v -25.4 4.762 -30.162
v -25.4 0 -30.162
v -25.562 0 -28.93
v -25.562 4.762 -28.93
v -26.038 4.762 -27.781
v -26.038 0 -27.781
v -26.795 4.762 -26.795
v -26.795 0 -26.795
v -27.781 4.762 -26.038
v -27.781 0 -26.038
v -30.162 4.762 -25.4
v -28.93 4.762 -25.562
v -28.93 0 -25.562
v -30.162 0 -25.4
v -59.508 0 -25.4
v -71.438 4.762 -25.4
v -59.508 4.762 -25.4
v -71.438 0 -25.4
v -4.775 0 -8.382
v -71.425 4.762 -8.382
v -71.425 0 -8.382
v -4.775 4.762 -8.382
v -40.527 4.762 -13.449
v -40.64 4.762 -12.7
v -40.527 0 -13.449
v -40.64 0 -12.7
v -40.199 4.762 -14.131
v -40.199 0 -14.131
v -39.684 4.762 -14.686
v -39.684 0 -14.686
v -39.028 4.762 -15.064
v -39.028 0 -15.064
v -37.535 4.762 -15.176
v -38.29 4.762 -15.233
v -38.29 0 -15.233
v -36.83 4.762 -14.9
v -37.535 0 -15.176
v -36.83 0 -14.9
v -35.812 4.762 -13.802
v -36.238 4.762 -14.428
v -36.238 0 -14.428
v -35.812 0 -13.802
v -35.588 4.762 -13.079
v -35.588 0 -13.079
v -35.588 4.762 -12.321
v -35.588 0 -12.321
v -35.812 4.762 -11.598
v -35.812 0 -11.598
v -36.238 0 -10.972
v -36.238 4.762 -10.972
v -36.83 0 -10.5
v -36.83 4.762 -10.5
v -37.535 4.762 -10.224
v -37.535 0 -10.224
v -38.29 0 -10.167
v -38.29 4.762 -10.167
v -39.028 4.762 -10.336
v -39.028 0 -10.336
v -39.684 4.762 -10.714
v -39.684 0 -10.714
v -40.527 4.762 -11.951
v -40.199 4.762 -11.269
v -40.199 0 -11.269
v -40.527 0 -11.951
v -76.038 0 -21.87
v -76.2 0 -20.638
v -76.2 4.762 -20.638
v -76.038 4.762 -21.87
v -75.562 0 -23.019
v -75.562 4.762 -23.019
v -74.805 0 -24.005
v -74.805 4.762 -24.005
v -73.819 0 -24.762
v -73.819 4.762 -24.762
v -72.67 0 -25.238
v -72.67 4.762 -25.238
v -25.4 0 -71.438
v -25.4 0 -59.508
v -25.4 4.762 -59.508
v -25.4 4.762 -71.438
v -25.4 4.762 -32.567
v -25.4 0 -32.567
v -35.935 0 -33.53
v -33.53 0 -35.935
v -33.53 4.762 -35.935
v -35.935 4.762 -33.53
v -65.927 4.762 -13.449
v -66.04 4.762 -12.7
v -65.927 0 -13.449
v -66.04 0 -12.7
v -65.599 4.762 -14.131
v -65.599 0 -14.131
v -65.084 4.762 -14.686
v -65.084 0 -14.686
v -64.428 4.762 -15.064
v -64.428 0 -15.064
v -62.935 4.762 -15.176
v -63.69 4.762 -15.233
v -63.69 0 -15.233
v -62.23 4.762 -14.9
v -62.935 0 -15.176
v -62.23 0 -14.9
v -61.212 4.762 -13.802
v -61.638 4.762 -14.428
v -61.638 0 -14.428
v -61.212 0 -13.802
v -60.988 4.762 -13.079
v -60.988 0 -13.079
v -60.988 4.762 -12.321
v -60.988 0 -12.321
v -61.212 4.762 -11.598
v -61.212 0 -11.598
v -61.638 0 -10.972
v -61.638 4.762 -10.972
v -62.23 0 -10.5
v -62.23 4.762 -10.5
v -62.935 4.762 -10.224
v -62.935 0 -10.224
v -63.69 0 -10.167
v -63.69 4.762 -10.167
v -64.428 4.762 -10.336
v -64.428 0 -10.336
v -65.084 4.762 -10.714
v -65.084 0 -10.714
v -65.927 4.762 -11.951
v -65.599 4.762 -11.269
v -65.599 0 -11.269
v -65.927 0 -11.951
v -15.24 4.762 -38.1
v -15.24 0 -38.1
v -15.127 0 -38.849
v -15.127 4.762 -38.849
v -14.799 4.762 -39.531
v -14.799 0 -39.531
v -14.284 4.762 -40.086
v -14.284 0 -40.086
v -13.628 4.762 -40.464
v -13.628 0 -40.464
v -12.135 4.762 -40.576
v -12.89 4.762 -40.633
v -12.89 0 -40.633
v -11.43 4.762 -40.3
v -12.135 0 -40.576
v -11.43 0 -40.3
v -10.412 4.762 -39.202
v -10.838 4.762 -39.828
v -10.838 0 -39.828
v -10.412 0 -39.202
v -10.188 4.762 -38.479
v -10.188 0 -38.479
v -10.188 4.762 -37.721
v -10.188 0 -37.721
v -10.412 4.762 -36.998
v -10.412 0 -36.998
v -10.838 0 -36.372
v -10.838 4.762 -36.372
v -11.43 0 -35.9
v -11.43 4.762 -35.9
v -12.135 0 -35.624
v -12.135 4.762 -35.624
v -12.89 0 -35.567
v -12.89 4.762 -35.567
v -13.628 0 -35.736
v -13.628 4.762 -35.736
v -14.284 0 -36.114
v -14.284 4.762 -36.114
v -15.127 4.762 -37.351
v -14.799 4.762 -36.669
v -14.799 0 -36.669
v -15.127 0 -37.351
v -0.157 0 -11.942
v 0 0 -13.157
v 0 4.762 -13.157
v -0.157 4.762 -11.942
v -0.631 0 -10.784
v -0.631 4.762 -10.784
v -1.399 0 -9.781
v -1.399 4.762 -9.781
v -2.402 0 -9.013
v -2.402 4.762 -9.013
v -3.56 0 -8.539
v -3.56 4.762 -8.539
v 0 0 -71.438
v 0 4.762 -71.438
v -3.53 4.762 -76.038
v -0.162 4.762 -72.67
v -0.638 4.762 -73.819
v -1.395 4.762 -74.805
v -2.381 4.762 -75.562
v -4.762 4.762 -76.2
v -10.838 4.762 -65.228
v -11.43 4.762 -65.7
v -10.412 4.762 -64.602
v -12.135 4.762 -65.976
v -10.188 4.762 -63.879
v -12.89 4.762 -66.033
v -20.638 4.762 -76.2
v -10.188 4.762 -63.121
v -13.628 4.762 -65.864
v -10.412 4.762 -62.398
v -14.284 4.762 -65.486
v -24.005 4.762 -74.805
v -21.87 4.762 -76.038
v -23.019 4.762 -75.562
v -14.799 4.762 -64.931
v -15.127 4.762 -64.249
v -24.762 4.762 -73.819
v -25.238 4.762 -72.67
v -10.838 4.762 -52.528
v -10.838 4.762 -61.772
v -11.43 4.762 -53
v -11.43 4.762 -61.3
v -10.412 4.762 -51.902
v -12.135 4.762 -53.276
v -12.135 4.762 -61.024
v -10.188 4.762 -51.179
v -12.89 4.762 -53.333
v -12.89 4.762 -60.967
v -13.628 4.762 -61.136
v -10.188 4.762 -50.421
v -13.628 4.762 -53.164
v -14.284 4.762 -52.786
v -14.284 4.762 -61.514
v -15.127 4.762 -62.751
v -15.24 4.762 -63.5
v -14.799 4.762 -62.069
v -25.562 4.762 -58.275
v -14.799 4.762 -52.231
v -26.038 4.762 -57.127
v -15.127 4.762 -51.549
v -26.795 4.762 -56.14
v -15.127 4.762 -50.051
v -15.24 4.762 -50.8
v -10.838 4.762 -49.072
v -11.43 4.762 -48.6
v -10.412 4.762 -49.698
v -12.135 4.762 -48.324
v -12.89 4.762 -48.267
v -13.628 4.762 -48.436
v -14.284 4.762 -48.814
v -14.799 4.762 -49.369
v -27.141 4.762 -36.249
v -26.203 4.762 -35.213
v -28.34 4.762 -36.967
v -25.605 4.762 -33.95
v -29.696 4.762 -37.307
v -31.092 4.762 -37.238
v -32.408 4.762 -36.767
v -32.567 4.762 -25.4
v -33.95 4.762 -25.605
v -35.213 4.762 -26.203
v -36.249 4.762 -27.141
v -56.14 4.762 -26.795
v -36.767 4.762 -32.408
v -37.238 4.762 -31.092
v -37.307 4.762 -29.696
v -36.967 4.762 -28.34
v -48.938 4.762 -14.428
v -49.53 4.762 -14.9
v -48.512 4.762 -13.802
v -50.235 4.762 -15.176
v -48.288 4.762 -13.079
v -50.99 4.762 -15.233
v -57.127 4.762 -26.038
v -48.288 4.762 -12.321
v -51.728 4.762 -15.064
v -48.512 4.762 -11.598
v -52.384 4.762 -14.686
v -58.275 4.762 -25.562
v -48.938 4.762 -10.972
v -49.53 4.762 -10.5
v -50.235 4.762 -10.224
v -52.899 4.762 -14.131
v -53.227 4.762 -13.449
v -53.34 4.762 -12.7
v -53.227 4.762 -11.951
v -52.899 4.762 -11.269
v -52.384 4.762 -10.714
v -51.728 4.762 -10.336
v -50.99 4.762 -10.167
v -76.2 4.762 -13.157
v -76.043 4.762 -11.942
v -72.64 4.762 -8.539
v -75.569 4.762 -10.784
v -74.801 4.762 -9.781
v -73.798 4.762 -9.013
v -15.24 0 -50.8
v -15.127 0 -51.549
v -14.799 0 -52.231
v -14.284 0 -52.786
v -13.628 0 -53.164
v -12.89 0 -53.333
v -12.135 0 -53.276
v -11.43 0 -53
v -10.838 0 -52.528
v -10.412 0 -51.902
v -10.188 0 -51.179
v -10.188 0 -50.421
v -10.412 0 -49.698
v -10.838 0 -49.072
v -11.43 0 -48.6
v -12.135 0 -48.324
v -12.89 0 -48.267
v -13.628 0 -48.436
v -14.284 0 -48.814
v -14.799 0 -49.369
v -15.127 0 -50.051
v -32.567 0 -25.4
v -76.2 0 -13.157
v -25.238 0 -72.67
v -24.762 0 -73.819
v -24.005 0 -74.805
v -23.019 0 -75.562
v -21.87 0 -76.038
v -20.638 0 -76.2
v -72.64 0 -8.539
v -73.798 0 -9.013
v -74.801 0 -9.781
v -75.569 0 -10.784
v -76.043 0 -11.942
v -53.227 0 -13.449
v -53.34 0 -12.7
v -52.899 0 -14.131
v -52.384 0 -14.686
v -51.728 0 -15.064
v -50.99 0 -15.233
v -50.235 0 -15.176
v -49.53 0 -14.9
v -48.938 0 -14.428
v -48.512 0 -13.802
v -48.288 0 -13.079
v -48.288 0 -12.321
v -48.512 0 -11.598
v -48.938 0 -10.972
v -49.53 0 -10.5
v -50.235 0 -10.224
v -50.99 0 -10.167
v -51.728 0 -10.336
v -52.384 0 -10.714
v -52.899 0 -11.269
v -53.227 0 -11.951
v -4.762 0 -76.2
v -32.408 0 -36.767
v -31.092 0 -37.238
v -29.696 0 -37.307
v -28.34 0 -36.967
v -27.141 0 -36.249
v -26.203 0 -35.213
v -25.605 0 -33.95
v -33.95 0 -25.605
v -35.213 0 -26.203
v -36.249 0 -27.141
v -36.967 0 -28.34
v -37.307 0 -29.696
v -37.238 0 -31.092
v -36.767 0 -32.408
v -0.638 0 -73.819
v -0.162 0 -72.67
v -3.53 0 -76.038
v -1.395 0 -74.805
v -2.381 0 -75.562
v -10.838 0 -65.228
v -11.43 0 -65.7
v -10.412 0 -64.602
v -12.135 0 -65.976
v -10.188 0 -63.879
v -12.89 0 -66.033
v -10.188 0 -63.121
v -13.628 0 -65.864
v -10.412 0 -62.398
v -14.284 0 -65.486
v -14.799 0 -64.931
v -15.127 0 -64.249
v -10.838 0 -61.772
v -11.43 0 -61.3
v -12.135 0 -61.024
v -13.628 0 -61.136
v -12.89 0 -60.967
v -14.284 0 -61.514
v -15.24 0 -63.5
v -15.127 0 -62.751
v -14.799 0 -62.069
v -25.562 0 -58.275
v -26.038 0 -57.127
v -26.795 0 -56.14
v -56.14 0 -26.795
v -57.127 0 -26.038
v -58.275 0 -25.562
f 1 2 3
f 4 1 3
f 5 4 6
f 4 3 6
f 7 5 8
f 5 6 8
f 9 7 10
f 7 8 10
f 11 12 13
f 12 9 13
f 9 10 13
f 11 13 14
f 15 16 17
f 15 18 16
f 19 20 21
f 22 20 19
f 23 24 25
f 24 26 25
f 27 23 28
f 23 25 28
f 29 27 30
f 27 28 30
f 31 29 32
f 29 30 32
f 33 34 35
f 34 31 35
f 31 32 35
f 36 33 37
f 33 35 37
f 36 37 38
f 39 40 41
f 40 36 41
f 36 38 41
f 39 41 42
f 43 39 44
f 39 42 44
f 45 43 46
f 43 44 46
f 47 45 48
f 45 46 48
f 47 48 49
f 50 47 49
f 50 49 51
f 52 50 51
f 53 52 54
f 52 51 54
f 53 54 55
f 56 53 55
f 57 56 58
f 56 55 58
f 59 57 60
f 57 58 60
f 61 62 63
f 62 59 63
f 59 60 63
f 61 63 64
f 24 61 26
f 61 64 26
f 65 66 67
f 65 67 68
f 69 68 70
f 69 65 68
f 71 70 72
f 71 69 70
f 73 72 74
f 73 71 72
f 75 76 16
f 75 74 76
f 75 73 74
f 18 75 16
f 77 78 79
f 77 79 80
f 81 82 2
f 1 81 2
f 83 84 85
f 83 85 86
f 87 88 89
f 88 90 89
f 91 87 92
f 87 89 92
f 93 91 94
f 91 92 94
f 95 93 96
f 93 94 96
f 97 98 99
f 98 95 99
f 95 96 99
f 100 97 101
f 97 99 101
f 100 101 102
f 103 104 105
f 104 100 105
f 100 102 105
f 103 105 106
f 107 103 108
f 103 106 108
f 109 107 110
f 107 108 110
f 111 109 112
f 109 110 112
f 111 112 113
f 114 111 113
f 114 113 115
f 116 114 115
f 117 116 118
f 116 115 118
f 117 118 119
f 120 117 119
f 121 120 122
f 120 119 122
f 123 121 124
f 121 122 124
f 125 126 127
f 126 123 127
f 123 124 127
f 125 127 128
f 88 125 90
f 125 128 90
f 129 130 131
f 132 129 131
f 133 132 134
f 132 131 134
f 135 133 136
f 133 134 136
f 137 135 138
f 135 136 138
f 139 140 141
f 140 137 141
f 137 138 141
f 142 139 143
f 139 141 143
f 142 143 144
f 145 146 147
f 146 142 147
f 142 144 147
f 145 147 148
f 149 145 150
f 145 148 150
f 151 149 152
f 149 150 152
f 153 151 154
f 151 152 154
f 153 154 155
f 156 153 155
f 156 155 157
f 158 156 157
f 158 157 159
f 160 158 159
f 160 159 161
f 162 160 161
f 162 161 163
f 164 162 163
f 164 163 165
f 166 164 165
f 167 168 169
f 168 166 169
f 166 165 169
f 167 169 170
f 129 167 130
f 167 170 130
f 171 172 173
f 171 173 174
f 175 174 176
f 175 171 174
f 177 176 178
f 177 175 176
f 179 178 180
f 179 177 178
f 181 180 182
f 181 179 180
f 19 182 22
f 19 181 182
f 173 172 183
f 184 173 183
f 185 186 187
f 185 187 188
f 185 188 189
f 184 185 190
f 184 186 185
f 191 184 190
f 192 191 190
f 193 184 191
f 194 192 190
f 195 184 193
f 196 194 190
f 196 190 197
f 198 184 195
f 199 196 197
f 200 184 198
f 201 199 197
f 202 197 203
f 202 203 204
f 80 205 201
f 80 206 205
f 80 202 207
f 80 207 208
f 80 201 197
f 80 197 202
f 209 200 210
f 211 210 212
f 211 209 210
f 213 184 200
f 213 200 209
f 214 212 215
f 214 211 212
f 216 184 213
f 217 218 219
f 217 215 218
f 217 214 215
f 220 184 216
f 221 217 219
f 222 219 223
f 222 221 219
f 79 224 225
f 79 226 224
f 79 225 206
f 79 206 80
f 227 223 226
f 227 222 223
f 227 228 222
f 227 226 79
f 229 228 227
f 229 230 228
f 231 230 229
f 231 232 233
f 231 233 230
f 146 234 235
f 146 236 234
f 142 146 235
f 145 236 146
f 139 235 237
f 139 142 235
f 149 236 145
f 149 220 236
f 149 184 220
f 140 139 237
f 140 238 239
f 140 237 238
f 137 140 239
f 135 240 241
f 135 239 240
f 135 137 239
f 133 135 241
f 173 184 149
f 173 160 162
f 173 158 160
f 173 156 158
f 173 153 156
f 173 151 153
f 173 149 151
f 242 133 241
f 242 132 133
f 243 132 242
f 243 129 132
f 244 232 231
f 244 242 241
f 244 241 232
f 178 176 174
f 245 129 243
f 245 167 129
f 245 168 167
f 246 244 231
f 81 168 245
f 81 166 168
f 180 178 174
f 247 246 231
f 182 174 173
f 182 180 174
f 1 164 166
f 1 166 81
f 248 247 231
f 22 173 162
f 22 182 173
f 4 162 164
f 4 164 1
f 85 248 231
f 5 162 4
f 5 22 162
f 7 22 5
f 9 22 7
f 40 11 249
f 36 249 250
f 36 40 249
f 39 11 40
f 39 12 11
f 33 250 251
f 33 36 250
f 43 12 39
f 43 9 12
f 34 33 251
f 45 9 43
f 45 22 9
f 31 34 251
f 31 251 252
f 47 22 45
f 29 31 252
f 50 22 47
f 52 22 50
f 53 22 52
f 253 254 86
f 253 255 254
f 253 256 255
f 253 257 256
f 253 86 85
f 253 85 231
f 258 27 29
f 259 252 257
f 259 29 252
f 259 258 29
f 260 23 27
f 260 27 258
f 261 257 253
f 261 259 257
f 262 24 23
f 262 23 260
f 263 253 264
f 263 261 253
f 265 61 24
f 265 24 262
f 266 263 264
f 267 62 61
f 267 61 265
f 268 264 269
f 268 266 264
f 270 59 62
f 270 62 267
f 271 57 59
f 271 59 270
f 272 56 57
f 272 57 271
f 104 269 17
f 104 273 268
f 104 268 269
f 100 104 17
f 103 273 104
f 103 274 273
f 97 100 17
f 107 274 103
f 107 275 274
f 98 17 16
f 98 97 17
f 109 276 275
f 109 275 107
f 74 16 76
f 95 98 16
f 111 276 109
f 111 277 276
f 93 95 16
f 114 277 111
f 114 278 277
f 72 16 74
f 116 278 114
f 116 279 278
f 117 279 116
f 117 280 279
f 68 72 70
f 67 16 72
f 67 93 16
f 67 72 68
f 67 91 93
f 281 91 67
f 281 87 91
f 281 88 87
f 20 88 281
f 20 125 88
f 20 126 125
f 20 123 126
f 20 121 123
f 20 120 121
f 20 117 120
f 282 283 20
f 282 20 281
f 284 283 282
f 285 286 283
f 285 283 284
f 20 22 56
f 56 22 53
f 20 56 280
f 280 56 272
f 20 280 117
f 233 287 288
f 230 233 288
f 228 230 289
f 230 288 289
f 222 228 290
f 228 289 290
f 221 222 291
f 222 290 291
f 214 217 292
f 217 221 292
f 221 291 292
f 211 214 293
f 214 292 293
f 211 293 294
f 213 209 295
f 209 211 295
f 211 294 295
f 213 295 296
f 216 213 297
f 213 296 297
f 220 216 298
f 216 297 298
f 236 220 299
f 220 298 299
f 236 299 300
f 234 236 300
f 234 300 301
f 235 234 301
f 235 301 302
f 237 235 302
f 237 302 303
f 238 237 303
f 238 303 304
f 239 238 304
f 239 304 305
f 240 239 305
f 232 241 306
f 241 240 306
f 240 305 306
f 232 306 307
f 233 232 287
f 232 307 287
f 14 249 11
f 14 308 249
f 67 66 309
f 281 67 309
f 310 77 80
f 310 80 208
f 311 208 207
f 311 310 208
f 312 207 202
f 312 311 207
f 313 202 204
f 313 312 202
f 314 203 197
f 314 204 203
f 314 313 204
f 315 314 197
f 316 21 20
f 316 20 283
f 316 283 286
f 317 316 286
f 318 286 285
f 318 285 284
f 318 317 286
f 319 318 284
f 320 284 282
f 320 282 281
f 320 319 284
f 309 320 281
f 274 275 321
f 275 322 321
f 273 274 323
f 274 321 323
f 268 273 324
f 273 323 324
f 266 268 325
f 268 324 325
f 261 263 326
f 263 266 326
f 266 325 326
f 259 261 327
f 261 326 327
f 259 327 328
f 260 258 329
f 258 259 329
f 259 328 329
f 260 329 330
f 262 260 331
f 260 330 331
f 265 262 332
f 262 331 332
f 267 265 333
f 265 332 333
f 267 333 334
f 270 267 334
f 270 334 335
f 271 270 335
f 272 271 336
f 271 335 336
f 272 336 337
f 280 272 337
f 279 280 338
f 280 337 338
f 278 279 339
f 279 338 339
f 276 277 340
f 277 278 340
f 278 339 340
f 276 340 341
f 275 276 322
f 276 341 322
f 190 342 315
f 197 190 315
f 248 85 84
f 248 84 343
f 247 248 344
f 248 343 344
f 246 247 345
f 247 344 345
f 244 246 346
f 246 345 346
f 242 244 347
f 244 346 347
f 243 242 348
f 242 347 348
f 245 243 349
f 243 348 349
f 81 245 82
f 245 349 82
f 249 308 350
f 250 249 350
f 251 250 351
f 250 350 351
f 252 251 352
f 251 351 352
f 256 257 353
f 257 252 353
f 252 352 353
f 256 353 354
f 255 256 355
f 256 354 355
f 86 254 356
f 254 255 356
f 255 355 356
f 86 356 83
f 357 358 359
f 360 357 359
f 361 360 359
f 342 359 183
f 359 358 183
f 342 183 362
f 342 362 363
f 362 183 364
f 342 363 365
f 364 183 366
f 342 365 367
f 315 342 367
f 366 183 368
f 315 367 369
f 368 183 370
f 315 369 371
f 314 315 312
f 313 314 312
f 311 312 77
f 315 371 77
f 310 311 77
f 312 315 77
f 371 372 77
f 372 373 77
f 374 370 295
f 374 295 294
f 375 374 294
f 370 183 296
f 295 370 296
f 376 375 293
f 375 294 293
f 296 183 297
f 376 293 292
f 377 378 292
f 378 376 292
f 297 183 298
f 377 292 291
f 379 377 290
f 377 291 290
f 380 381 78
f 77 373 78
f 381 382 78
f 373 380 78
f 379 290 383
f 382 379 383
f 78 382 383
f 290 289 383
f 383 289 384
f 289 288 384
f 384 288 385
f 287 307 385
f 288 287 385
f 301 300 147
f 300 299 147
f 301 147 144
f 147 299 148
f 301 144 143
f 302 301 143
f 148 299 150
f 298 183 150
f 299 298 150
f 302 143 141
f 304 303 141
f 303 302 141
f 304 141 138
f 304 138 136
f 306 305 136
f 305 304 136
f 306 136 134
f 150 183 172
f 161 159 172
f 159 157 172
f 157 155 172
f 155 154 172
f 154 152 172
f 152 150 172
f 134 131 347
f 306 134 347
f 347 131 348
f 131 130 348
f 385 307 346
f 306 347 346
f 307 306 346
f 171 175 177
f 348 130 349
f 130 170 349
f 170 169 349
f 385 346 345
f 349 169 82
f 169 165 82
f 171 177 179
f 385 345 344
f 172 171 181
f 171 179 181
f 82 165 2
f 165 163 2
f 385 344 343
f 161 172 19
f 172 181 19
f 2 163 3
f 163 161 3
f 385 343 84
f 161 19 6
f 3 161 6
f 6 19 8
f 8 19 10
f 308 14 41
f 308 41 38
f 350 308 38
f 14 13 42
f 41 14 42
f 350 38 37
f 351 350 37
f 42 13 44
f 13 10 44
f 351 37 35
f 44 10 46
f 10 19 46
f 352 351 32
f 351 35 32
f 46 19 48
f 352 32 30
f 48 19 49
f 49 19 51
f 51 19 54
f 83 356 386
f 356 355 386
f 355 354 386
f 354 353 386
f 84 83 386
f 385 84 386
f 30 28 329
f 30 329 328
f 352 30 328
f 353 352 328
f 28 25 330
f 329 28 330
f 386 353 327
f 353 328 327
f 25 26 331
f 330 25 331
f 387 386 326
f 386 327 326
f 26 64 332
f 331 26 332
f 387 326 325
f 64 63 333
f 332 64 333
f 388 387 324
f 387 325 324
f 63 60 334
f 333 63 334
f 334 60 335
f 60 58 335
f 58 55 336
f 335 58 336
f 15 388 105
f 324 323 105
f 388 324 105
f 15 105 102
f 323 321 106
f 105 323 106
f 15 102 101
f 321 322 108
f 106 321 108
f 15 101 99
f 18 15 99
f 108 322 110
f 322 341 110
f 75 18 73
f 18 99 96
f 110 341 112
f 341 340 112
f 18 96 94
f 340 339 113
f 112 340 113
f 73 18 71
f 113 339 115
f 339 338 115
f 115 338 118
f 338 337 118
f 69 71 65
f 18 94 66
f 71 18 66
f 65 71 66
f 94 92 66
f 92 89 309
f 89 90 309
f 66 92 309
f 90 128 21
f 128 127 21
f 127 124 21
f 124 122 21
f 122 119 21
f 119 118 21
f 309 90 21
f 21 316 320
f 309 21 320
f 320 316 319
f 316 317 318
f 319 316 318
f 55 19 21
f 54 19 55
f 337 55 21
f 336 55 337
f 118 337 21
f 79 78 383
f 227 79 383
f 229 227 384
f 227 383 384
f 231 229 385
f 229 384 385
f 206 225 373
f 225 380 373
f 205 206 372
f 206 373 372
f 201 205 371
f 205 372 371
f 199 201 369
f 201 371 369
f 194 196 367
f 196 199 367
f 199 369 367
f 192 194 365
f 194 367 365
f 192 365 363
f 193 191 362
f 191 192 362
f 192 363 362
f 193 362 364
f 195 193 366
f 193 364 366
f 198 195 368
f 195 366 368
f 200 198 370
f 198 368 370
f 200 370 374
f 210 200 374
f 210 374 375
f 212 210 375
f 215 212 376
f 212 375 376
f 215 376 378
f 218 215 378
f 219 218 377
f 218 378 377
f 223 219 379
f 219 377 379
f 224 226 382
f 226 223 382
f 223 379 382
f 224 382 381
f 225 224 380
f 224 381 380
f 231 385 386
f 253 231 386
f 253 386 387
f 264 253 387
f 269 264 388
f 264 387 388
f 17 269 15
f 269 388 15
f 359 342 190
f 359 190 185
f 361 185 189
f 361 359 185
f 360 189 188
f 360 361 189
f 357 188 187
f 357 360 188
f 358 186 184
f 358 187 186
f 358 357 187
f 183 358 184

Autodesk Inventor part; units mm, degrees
ref_plane "YZ Plane" through (0, 0, 0) normal (1, 0, 0) x (0, 1, 0)
ref_plane "XZ Plane" through (0, 0, 0) normal (0, 1, 0) x (-1, 0, 0)
ref_plane "XY Plane" through (0, 0, 0) normal (0, 0, 1) x (1, 0, 0)
sketch "Sketch1" plane through (0, 0, 0) normal (0, 1, 0) x (-1, 0, 0)
  line L0 (0, -11.8745) -> (0, -71.4375)
  line L1 (4.7625, -76.2) -> (20.6375, -76.2)
  line L2 (76.2, -20.6375) -> (76.2, -11.8745)
  line L3 (71.4375, -7.112) -> (4.7625, -7.112)
  circle A0 centre (12.7, -38.1) radius 2.54
  arc A1 (4.7625, -7.112) -> (0, -11.8745) centre (4.7625, -11.8745) ccw
  circle A2 centre (12.7, -50.8) radius 2.54
  circle A3 centre (12.7, -63.5) radius 2.54
  circle A4 centre (38.1, -12.7) radius 2.54
  circle A5 centre (50.8, -12.7) radius 2.54
  circle A6 centre (63.5, -12.7) radius 2.54
  line L4 (14.4961, -61.7039) -> (61.7039, -14.4961) construction
  line L5 (26.7949, -56.1403) -> (56.1403, -26.7949)
  line L6 (33.5301, -35.9347) -> (35.9347, -33.5301)
  line L7 (25.4, -76.2) -> (25.4, -25.4) construction
  line L8 (76.2, -25.4) -> (25.4, -25.4) construction
  line L9 (25.4, -59.5079) -> (25.4, -71.4375)
  line L10 (71.4375, -25.4) -> (59.5079, -25.4)
  arc A7 (71.4375, -25.4) -> (76.2, -20.6375) centre (71.4375, -20.6375) ccw
  arc A8 (76.2, -11.8745) -> (71.4375, -7.112) centre (71.4375, -11.8745) ccw
  arc A9 (20.6375, -76.2) -> (25.4, -71.4375) centre (20.6375, -71.4375) ccw
  arc A10 (0, -71.4375) -> (4.7625, -76.2) centre (4.7625, -71.4375) ccw
  line L11 (32.5671, -25.4) -> (30.1625, -25.4)
  line L12 (25.4, -32.5671) -> (25.4, -30.1625)
  arc A11 (59.5079, -25.4) -> (56.1403, -26.7949) centre (59.5079, -30.1625) ccw
  arc A12 (26.7949, -56.1403) -> (25.4, -59.5079) centre (30.1625, -59.5079) ccw
  arc A13 (35.9347, -33.5301) -> (32.5671, -25.4) centre (32.5671, -30.1625) ccw
  arc A14 (25.4, -32.5671) -> (33.5301, -35.9347) centre (30.1625, -32.5671) ccw
  arc A15 (30.1625, -25.4) -> (25.4, -30.1625) centre (30.1625, -30.1625) ccw
  point P0 (0, 0)
  point P1 (0, -76.2)
  point P2 (25.4, -57.5352)
  point P3 (57.5352, -25.4)
  point P4 (25.4, -44.0648)
  point P5 (44.0648, -25.4)
  dimension "d2" = 76.2
  dimension "d4" = 5.08
  dimension "d5" = 4.7625
  dimension "d7" = 12.7
  dimension "d8" = 12.7
  dimension "d9" = 12.7
  dimension "d10" = 5.08
  dimension "d11" = 12.7
  dimension "d12" = 12.7
  dimension "d13" = 38.1
  dimension "d18" = 25.4
  dimension "d20" = 4.7625
  dimension "d21" = 4.7625
  dimension "d22" = 4.7625
  dimension "d23" = 4.7625
  dimension "d24" = 4.7625
  dimension "d29" = 18.288
  dimension "d30" = 25.4
  dimension "d31" = 76.2
  dimension "d32" = 12.7
  dimension "d33" = 38.1
extrude "Extrusion1" add sketch "Sketch1" along normal blind 4.7625
sketch "Sketch2" plane through (0, 4.7625, 0) normal (0, 1, 0) x (1, 0, 0)
  line L0 (-71.4375, 7.112) -> (-4.7625, 7.112) projected
  line L1 (-76.2, 8.382) -> (0, 8.382)
  line L2 (-76.2, 20.6375) -> (-76.2, 11.8745) projected
  line L3 (0, 11.8745) -> (0, 71.4375) projected
  line L4 (-4.7625, 7.112) -> (0, 7.112)
  line L5 (0, 7.112) -> (0, 8.382)
  line L6 (-76.2, 8.382) -> (-76.2, 7.112)
  line L7 (-76.2, 7.112) -> (-71.4375, 7.112)
  point P0 (0, 0)
  dimension "d34" = 1.27
extrude "Extrusion2" cut sketch "Sketch2" against normal through all
fillet "Fillet1" radius 4.7752 2 edges at (-74.6754, 2.3813, -8.382) (-1.5246, 2.3813, -8.382)
properties part number "ELEV_007_SUPBRK2" material "Aluminum 6061"
